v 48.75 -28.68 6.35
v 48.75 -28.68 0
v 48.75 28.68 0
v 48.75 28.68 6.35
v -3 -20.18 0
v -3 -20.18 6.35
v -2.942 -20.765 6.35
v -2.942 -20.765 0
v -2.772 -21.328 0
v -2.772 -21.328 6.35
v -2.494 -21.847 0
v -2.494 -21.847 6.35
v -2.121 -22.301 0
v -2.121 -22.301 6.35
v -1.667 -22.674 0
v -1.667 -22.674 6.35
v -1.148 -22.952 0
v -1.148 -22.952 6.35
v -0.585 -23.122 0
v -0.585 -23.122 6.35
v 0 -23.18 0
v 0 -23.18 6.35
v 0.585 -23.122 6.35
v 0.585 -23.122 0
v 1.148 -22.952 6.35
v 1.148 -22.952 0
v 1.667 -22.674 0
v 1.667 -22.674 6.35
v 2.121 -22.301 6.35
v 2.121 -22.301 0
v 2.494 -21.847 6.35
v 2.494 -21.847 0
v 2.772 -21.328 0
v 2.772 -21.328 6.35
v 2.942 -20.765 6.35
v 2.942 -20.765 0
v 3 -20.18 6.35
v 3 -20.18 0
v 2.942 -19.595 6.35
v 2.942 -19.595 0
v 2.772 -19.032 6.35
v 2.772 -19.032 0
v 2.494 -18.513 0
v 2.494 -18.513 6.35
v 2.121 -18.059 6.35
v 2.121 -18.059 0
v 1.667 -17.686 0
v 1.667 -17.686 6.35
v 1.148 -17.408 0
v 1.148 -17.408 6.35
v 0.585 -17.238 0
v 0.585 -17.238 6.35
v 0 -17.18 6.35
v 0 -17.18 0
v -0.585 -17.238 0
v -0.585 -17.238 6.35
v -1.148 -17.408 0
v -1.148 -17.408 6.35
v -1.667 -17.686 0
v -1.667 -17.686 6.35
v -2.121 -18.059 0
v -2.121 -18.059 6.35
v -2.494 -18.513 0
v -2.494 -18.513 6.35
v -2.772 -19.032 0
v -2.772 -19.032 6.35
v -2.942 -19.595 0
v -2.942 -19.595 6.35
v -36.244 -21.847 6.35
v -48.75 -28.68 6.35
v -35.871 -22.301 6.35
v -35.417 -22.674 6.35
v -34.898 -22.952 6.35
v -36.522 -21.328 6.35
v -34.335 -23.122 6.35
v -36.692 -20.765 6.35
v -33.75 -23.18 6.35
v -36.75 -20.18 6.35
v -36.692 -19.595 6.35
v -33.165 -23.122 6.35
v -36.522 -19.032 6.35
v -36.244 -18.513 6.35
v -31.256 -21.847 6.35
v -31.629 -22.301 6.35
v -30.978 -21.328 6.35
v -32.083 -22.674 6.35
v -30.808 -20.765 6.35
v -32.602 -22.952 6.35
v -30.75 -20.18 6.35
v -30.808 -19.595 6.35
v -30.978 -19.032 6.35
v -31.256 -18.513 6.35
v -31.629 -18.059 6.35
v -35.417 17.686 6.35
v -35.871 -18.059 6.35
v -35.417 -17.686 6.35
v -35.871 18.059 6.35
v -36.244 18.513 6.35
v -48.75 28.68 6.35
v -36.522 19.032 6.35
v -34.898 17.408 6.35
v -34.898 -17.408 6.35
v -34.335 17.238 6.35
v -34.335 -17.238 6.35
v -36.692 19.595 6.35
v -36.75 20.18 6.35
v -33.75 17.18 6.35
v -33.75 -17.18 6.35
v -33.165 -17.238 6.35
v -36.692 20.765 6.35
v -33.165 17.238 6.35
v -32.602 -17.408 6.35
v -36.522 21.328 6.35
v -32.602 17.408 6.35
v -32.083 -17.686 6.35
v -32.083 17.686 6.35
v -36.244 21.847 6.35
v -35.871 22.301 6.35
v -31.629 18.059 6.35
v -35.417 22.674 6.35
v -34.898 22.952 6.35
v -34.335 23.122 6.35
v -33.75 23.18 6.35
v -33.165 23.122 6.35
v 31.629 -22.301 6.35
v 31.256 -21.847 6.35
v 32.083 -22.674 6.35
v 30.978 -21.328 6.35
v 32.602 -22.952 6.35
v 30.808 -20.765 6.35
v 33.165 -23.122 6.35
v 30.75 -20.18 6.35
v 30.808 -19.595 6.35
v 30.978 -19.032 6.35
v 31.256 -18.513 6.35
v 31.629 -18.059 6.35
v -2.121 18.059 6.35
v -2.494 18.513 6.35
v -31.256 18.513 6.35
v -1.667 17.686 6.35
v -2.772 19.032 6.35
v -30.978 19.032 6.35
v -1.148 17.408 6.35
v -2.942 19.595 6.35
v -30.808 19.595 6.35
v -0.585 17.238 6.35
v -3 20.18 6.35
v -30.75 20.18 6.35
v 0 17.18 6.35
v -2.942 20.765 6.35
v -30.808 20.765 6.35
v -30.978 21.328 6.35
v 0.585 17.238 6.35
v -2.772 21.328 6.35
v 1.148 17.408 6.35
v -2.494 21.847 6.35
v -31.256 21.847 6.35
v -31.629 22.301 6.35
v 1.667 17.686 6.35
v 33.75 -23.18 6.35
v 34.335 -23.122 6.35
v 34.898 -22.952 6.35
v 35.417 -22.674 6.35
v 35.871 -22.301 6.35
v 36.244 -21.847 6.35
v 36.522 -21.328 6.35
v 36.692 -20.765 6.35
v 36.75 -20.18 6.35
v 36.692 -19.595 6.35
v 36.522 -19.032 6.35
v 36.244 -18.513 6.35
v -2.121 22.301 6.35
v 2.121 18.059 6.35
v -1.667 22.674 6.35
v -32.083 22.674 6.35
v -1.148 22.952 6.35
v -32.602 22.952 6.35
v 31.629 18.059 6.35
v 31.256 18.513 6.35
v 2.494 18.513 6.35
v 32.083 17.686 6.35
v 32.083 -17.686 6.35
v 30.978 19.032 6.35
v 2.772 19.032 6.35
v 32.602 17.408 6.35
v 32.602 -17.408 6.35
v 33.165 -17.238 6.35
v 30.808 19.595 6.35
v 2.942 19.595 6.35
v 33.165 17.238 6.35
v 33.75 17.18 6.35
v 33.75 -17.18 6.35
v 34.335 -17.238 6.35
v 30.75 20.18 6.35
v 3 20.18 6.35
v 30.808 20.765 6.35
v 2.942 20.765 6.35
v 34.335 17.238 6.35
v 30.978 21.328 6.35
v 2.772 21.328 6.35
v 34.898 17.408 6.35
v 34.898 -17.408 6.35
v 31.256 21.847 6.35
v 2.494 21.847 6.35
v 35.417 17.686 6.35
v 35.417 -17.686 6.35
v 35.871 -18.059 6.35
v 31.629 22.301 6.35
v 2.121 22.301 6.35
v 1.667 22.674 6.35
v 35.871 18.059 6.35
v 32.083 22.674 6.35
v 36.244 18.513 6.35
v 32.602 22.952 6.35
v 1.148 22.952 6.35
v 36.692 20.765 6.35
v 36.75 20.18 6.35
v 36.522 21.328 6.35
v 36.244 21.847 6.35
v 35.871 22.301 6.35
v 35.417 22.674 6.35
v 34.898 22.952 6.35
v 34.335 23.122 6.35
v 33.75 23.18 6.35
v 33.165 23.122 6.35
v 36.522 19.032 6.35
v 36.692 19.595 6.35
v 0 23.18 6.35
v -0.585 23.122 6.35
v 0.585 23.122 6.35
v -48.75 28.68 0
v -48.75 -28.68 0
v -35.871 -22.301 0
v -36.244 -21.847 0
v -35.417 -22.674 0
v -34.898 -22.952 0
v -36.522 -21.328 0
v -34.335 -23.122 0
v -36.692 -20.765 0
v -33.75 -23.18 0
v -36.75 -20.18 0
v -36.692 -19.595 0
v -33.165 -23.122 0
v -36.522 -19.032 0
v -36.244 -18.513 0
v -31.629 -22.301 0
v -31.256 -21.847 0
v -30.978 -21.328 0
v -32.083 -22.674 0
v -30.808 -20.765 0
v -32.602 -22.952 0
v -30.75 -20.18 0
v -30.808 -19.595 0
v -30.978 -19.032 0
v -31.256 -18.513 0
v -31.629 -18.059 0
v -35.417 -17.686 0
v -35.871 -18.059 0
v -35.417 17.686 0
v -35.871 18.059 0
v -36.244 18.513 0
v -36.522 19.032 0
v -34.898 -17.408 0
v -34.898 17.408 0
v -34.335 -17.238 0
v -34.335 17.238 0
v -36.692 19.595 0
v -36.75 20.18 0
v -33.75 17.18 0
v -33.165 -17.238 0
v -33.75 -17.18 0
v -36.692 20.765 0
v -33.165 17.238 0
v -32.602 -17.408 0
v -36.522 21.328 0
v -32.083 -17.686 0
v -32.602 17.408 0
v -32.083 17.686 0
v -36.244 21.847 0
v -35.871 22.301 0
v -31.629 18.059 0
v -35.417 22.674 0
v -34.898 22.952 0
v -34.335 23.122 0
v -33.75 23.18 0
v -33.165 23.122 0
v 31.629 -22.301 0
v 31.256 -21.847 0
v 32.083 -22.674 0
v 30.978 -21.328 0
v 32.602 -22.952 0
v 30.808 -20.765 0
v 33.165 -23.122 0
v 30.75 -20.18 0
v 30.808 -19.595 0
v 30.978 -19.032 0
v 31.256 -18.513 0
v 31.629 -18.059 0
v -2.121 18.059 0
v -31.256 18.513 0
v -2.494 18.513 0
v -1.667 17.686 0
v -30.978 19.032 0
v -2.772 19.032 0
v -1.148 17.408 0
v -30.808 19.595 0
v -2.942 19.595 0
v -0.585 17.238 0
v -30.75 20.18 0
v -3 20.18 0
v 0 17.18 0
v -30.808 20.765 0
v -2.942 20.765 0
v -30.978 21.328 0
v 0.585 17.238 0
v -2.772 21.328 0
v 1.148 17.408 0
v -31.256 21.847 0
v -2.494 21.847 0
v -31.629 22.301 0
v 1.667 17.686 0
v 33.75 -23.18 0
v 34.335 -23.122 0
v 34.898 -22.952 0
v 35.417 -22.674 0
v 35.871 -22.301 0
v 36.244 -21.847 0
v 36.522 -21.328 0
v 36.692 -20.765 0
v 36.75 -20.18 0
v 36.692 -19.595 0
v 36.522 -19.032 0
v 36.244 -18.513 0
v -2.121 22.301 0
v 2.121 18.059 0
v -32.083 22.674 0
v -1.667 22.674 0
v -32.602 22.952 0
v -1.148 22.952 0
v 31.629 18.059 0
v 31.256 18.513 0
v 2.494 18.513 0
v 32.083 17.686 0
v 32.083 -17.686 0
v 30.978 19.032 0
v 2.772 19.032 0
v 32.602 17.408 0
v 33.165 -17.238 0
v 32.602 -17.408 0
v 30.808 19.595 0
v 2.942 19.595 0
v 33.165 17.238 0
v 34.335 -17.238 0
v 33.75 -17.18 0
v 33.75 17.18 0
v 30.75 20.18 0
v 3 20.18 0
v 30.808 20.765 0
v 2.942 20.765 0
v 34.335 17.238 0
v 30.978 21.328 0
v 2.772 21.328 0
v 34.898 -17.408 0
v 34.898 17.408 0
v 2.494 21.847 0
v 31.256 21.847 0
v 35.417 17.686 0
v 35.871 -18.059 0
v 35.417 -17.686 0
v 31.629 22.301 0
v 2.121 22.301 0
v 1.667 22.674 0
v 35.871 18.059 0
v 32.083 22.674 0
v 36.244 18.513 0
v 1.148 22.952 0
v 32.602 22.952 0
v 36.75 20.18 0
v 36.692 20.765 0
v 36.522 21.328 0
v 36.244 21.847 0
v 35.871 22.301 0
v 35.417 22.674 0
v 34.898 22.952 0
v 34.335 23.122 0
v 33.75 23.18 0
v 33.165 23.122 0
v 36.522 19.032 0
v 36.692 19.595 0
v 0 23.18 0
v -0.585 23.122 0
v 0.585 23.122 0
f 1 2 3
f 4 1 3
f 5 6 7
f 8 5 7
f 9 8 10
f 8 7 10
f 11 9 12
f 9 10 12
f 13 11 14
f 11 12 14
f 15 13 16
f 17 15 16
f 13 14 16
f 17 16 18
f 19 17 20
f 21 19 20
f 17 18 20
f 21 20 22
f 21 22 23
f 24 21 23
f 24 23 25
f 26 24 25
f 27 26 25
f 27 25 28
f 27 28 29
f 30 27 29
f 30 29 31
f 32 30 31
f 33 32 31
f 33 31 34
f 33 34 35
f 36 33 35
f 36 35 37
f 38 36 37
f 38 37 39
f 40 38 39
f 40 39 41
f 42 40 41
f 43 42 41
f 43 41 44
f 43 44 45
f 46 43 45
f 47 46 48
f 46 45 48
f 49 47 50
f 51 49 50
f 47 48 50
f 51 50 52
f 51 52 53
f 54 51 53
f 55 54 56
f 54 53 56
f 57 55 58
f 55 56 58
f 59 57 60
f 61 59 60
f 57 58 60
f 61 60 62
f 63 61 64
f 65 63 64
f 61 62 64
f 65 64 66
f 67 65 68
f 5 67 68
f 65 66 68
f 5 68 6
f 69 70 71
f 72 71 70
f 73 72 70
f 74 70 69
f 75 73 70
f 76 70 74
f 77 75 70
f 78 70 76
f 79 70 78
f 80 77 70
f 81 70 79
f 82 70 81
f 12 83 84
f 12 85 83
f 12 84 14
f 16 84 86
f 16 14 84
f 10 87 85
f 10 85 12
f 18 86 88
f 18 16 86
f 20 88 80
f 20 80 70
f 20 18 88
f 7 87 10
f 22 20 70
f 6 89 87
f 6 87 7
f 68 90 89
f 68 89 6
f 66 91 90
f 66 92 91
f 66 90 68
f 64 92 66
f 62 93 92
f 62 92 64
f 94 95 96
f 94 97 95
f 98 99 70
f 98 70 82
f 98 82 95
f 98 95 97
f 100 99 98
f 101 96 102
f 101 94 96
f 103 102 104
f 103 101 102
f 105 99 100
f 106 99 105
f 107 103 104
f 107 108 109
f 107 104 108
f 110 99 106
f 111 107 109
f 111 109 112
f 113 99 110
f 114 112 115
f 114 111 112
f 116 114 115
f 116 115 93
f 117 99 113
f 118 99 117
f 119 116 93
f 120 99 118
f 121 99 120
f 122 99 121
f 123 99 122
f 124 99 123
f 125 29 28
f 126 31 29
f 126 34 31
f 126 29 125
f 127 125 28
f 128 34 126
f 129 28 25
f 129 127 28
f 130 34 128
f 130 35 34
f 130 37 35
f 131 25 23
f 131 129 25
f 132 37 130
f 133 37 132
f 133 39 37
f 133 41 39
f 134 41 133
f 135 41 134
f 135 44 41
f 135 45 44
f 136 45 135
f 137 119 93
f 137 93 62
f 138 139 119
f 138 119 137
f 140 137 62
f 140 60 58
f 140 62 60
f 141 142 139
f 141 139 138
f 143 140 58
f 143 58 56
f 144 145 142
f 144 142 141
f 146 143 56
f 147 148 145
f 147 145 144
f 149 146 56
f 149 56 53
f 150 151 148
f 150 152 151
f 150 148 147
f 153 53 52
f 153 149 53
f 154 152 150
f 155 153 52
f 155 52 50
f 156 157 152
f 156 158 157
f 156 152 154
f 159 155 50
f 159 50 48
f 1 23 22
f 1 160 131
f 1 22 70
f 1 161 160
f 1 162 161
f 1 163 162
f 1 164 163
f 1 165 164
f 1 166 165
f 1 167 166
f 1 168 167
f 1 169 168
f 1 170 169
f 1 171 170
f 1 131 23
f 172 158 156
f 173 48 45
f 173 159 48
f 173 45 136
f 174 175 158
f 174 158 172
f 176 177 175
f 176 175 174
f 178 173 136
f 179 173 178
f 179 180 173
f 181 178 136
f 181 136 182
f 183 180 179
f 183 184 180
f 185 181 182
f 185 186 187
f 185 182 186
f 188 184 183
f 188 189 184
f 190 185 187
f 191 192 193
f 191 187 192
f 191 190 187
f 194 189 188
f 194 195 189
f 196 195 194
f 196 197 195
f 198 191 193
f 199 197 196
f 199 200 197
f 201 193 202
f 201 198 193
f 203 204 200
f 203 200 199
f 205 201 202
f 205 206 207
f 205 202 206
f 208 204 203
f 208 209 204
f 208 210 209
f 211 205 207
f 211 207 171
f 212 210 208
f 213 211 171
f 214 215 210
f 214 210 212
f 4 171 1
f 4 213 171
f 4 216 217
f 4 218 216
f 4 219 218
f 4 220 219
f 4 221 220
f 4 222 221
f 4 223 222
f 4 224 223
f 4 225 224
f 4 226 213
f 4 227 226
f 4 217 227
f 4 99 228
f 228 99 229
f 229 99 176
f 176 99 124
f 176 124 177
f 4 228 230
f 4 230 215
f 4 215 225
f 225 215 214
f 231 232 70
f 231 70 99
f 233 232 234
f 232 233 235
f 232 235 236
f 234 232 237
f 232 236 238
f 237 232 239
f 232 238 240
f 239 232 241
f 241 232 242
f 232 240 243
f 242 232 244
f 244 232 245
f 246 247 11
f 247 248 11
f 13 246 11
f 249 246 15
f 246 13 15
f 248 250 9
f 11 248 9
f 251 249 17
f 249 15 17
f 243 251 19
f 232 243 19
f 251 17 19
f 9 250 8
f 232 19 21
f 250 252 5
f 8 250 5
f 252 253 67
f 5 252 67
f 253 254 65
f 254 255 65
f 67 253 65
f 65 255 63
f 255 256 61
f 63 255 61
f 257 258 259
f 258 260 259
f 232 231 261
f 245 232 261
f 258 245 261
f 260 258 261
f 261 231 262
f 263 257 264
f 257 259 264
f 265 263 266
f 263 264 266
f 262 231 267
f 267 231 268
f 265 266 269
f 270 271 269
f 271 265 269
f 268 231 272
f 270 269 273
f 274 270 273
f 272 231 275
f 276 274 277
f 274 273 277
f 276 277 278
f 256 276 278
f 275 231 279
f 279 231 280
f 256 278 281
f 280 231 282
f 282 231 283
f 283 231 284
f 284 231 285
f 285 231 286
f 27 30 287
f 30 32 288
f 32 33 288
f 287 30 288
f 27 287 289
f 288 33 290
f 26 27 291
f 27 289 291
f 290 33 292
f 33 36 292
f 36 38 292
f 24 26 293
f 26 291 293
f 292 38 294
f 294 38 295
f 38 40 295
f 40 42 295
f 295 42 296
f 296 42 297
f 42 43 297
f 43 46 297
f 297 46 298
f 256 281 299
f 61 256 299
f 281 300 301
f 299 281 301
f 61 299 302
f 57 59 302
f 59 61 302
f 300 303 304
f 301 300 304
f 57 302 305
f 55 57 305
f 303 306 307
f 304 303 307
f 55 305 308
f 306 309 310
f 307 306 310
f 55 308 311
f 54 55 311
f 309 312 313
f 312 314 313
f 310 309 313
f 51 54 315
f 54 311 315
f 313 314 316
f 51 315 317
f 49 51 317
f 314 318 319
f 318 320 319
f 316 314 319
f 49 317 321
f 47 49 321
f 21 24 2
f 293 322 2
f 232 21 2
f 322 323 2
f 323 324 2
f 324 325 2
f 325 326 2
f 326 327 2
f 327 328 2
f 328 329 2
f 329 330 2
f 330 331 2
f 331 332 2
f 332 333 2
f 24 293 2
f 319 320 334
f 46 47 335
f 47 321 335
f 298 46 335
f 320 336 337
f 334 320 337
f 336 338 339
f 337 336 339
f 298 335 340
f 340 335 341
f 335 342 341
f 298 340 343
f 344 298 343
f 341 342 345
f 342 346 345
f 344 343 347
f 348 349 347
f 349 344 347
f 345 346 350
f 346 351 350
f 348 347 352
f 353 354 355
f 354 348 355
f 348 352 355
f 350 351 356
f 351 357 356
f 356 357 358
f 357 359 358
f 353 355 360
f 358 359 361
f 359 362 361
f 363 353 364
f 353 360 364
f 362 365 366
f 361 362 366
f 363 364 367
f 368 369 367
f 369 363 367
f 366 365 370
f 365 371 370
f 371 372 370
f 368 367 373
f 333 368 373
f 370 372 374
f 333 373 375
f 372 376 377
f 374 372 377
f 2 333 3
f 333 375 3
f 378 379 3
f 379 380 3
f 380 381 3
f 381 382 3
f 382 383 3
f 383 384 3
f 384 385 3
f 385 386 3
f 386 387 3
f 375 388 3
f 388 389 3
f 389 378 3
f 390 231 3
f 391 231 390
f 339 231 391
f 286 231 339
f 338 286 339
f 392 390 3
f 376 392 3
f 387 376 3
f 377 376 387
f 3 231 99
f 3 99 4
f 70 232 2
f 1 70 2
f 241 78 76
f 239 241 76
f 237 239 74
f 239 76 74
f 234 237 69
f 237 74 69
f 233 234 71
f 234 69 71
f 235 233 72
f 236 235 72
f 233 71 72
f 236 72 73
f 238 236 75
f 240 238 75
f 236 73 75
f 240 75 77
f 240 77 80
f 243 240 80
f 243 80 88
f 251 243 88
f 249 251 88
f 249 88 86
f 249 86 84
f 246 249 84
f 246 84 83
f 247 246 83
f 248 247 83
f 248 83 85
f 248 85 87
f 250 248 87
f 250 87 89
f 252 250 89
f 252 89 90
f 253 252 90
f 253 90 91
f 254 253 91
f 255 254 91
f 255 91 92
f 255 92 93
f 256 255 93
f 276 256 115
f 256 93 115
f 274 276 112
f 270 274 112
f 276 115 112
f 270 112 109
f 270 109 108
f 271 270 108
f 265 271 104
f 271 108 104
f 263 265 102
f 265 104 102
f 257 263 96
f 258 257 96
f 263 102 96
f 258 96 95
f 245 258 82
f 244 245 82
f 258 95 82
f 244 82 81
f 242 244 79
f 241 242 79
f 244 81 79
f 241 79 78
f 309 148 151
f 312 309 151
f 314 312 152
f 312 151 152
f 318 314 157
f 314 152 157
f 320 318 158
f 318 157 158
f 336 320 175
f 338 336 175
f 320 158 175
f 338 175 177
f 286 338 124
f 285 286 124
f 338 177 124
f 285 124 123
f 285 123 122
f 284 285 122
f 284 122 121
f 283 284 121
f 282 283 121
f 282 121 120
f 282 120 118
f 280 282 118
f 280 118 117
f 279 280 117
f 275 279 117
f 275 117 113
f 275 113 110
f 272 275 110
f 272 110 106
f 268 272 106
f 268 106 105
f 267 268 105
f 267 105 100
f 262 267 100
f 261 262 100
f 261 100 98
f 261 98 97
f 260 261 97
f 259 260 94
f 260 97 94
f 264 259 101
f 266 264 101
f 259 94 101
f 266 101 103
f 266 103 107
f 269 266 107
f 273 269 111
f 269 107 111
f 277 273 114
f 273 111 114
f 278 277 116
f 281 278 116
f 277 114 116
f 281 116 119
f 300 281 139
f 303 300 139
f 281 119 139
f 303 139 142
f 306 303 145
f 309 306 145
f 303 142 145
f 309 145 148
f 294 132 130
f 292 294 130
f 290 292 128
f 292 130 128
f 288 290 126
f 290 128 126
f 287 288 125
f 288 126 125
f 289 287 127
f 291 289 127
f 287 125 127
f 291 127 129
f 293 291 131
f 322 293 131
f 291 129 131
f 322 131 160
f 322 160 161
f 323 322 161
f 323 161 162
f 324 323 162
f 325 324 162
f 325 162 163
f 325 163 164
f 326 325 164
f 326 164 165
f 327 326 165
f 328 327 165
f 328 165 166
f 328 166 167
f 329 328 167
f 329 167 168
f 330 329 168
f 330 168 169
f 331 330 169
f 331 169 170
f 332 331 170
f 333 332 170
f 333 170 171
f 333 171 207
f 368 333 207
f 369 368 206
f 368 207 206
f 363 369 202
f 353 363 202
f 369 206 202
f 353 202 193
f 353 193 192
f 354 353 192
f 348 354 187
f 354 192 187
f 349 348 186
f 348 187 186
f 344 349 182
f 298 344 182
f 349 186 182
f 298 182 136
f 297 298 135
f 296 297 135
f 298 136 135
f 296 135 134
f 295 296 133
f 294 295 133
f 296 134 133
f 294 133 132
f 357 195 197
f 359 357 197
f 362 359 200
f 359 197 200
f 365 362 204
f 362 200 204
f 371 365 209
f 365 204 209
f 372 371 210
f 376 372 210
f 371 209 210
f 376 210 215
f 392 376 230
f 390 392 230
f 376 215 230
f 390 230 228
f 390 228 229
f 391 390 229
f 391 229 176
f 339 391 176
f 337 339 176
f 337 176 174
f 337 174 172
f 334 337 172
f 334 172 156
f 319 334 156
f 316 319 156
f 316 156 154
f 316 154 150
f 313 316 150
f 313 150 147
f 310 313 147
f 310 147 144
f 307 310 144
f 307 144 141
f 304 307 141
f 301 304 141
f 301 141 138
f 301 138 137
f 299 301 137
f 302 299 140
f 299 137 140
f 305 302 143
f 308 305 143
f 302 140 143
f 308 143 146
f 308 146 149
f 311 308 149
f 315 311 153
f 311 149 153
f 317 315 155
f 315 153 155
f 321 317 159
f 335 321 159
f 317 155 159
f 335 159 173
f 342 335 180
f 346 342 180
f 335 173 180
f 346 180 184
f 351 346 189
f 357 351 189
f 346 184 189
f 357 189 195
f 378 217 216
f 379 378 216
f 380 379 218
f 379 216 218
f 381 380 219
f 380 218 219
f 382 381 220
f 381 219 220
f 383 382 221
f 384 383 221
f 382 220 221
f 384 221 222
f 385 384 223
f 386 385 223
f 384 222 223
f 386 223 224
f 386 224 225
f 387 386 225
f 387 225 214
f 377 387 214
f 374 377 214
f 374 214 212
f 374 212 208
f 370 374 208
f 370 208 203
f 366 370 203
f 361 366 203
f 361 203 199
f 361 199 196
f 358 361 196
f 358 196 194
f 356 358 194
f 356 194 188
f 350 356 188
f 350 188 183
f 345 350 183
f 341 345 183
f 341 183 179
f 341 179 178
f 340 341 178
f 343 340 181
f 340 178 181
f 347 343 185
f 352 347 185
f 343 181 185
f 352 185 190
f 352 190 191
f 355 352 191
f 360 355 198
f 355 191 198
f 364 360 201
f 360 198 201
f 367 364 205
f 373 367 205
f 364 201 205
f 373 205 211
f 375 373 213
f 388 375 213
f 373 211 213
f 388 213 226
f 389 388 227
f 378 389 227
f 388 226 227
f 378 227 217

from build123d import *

# Parameters (mm, degrees)
SKETCH1_W           = 97.5
SKETCH1_H           = 57.36
BOSS_EXTRUDE1_DEPTH = 6.35
SKETCH2_R           = 3
CUT_EXTRUDE1_DEPTH  = 57.915967882


with BuildPart() as part:
    # Sketch1 → Boss-Extrude1 (new body)
    with BuildSketch(Plane.XY):
        Rectangle(SKETCH1_W, SKETCH1_H)
    extrude(amount=BOSS_EXTRUDE1_DEPTH)

    # Sketch2 → Cut-Extrude1 (cut, through all)
    with BuildSketch(Plane.XY.offset(6.35)):
        with Locations((-33.75, 20.18)):
            Circle(SKETCH2_R)
        with Locations((0, 20.18)):
            Circle(SKETCH2_R)
        with Locations((33.75, 20.18)):
            Circle(SKETCH2_R)
        with Locations(Location((33.75, -20.18, 0), (0, 0, 180))):
            Circle(SKETCH2_R)
        with Locations(Location((0, -20.18, 0), (0, 0, 180))):
            Circle(SKETCH2_R)
        with Locations(Location((-33.75, -20.18, 0), (0, 0, 180))):
            Circle(SKETCH2_R)
    extrude(amount=-CUT_EXTRUDE1_DEPTH, mode=Mode.SUBTRACT)


solid = part.part
